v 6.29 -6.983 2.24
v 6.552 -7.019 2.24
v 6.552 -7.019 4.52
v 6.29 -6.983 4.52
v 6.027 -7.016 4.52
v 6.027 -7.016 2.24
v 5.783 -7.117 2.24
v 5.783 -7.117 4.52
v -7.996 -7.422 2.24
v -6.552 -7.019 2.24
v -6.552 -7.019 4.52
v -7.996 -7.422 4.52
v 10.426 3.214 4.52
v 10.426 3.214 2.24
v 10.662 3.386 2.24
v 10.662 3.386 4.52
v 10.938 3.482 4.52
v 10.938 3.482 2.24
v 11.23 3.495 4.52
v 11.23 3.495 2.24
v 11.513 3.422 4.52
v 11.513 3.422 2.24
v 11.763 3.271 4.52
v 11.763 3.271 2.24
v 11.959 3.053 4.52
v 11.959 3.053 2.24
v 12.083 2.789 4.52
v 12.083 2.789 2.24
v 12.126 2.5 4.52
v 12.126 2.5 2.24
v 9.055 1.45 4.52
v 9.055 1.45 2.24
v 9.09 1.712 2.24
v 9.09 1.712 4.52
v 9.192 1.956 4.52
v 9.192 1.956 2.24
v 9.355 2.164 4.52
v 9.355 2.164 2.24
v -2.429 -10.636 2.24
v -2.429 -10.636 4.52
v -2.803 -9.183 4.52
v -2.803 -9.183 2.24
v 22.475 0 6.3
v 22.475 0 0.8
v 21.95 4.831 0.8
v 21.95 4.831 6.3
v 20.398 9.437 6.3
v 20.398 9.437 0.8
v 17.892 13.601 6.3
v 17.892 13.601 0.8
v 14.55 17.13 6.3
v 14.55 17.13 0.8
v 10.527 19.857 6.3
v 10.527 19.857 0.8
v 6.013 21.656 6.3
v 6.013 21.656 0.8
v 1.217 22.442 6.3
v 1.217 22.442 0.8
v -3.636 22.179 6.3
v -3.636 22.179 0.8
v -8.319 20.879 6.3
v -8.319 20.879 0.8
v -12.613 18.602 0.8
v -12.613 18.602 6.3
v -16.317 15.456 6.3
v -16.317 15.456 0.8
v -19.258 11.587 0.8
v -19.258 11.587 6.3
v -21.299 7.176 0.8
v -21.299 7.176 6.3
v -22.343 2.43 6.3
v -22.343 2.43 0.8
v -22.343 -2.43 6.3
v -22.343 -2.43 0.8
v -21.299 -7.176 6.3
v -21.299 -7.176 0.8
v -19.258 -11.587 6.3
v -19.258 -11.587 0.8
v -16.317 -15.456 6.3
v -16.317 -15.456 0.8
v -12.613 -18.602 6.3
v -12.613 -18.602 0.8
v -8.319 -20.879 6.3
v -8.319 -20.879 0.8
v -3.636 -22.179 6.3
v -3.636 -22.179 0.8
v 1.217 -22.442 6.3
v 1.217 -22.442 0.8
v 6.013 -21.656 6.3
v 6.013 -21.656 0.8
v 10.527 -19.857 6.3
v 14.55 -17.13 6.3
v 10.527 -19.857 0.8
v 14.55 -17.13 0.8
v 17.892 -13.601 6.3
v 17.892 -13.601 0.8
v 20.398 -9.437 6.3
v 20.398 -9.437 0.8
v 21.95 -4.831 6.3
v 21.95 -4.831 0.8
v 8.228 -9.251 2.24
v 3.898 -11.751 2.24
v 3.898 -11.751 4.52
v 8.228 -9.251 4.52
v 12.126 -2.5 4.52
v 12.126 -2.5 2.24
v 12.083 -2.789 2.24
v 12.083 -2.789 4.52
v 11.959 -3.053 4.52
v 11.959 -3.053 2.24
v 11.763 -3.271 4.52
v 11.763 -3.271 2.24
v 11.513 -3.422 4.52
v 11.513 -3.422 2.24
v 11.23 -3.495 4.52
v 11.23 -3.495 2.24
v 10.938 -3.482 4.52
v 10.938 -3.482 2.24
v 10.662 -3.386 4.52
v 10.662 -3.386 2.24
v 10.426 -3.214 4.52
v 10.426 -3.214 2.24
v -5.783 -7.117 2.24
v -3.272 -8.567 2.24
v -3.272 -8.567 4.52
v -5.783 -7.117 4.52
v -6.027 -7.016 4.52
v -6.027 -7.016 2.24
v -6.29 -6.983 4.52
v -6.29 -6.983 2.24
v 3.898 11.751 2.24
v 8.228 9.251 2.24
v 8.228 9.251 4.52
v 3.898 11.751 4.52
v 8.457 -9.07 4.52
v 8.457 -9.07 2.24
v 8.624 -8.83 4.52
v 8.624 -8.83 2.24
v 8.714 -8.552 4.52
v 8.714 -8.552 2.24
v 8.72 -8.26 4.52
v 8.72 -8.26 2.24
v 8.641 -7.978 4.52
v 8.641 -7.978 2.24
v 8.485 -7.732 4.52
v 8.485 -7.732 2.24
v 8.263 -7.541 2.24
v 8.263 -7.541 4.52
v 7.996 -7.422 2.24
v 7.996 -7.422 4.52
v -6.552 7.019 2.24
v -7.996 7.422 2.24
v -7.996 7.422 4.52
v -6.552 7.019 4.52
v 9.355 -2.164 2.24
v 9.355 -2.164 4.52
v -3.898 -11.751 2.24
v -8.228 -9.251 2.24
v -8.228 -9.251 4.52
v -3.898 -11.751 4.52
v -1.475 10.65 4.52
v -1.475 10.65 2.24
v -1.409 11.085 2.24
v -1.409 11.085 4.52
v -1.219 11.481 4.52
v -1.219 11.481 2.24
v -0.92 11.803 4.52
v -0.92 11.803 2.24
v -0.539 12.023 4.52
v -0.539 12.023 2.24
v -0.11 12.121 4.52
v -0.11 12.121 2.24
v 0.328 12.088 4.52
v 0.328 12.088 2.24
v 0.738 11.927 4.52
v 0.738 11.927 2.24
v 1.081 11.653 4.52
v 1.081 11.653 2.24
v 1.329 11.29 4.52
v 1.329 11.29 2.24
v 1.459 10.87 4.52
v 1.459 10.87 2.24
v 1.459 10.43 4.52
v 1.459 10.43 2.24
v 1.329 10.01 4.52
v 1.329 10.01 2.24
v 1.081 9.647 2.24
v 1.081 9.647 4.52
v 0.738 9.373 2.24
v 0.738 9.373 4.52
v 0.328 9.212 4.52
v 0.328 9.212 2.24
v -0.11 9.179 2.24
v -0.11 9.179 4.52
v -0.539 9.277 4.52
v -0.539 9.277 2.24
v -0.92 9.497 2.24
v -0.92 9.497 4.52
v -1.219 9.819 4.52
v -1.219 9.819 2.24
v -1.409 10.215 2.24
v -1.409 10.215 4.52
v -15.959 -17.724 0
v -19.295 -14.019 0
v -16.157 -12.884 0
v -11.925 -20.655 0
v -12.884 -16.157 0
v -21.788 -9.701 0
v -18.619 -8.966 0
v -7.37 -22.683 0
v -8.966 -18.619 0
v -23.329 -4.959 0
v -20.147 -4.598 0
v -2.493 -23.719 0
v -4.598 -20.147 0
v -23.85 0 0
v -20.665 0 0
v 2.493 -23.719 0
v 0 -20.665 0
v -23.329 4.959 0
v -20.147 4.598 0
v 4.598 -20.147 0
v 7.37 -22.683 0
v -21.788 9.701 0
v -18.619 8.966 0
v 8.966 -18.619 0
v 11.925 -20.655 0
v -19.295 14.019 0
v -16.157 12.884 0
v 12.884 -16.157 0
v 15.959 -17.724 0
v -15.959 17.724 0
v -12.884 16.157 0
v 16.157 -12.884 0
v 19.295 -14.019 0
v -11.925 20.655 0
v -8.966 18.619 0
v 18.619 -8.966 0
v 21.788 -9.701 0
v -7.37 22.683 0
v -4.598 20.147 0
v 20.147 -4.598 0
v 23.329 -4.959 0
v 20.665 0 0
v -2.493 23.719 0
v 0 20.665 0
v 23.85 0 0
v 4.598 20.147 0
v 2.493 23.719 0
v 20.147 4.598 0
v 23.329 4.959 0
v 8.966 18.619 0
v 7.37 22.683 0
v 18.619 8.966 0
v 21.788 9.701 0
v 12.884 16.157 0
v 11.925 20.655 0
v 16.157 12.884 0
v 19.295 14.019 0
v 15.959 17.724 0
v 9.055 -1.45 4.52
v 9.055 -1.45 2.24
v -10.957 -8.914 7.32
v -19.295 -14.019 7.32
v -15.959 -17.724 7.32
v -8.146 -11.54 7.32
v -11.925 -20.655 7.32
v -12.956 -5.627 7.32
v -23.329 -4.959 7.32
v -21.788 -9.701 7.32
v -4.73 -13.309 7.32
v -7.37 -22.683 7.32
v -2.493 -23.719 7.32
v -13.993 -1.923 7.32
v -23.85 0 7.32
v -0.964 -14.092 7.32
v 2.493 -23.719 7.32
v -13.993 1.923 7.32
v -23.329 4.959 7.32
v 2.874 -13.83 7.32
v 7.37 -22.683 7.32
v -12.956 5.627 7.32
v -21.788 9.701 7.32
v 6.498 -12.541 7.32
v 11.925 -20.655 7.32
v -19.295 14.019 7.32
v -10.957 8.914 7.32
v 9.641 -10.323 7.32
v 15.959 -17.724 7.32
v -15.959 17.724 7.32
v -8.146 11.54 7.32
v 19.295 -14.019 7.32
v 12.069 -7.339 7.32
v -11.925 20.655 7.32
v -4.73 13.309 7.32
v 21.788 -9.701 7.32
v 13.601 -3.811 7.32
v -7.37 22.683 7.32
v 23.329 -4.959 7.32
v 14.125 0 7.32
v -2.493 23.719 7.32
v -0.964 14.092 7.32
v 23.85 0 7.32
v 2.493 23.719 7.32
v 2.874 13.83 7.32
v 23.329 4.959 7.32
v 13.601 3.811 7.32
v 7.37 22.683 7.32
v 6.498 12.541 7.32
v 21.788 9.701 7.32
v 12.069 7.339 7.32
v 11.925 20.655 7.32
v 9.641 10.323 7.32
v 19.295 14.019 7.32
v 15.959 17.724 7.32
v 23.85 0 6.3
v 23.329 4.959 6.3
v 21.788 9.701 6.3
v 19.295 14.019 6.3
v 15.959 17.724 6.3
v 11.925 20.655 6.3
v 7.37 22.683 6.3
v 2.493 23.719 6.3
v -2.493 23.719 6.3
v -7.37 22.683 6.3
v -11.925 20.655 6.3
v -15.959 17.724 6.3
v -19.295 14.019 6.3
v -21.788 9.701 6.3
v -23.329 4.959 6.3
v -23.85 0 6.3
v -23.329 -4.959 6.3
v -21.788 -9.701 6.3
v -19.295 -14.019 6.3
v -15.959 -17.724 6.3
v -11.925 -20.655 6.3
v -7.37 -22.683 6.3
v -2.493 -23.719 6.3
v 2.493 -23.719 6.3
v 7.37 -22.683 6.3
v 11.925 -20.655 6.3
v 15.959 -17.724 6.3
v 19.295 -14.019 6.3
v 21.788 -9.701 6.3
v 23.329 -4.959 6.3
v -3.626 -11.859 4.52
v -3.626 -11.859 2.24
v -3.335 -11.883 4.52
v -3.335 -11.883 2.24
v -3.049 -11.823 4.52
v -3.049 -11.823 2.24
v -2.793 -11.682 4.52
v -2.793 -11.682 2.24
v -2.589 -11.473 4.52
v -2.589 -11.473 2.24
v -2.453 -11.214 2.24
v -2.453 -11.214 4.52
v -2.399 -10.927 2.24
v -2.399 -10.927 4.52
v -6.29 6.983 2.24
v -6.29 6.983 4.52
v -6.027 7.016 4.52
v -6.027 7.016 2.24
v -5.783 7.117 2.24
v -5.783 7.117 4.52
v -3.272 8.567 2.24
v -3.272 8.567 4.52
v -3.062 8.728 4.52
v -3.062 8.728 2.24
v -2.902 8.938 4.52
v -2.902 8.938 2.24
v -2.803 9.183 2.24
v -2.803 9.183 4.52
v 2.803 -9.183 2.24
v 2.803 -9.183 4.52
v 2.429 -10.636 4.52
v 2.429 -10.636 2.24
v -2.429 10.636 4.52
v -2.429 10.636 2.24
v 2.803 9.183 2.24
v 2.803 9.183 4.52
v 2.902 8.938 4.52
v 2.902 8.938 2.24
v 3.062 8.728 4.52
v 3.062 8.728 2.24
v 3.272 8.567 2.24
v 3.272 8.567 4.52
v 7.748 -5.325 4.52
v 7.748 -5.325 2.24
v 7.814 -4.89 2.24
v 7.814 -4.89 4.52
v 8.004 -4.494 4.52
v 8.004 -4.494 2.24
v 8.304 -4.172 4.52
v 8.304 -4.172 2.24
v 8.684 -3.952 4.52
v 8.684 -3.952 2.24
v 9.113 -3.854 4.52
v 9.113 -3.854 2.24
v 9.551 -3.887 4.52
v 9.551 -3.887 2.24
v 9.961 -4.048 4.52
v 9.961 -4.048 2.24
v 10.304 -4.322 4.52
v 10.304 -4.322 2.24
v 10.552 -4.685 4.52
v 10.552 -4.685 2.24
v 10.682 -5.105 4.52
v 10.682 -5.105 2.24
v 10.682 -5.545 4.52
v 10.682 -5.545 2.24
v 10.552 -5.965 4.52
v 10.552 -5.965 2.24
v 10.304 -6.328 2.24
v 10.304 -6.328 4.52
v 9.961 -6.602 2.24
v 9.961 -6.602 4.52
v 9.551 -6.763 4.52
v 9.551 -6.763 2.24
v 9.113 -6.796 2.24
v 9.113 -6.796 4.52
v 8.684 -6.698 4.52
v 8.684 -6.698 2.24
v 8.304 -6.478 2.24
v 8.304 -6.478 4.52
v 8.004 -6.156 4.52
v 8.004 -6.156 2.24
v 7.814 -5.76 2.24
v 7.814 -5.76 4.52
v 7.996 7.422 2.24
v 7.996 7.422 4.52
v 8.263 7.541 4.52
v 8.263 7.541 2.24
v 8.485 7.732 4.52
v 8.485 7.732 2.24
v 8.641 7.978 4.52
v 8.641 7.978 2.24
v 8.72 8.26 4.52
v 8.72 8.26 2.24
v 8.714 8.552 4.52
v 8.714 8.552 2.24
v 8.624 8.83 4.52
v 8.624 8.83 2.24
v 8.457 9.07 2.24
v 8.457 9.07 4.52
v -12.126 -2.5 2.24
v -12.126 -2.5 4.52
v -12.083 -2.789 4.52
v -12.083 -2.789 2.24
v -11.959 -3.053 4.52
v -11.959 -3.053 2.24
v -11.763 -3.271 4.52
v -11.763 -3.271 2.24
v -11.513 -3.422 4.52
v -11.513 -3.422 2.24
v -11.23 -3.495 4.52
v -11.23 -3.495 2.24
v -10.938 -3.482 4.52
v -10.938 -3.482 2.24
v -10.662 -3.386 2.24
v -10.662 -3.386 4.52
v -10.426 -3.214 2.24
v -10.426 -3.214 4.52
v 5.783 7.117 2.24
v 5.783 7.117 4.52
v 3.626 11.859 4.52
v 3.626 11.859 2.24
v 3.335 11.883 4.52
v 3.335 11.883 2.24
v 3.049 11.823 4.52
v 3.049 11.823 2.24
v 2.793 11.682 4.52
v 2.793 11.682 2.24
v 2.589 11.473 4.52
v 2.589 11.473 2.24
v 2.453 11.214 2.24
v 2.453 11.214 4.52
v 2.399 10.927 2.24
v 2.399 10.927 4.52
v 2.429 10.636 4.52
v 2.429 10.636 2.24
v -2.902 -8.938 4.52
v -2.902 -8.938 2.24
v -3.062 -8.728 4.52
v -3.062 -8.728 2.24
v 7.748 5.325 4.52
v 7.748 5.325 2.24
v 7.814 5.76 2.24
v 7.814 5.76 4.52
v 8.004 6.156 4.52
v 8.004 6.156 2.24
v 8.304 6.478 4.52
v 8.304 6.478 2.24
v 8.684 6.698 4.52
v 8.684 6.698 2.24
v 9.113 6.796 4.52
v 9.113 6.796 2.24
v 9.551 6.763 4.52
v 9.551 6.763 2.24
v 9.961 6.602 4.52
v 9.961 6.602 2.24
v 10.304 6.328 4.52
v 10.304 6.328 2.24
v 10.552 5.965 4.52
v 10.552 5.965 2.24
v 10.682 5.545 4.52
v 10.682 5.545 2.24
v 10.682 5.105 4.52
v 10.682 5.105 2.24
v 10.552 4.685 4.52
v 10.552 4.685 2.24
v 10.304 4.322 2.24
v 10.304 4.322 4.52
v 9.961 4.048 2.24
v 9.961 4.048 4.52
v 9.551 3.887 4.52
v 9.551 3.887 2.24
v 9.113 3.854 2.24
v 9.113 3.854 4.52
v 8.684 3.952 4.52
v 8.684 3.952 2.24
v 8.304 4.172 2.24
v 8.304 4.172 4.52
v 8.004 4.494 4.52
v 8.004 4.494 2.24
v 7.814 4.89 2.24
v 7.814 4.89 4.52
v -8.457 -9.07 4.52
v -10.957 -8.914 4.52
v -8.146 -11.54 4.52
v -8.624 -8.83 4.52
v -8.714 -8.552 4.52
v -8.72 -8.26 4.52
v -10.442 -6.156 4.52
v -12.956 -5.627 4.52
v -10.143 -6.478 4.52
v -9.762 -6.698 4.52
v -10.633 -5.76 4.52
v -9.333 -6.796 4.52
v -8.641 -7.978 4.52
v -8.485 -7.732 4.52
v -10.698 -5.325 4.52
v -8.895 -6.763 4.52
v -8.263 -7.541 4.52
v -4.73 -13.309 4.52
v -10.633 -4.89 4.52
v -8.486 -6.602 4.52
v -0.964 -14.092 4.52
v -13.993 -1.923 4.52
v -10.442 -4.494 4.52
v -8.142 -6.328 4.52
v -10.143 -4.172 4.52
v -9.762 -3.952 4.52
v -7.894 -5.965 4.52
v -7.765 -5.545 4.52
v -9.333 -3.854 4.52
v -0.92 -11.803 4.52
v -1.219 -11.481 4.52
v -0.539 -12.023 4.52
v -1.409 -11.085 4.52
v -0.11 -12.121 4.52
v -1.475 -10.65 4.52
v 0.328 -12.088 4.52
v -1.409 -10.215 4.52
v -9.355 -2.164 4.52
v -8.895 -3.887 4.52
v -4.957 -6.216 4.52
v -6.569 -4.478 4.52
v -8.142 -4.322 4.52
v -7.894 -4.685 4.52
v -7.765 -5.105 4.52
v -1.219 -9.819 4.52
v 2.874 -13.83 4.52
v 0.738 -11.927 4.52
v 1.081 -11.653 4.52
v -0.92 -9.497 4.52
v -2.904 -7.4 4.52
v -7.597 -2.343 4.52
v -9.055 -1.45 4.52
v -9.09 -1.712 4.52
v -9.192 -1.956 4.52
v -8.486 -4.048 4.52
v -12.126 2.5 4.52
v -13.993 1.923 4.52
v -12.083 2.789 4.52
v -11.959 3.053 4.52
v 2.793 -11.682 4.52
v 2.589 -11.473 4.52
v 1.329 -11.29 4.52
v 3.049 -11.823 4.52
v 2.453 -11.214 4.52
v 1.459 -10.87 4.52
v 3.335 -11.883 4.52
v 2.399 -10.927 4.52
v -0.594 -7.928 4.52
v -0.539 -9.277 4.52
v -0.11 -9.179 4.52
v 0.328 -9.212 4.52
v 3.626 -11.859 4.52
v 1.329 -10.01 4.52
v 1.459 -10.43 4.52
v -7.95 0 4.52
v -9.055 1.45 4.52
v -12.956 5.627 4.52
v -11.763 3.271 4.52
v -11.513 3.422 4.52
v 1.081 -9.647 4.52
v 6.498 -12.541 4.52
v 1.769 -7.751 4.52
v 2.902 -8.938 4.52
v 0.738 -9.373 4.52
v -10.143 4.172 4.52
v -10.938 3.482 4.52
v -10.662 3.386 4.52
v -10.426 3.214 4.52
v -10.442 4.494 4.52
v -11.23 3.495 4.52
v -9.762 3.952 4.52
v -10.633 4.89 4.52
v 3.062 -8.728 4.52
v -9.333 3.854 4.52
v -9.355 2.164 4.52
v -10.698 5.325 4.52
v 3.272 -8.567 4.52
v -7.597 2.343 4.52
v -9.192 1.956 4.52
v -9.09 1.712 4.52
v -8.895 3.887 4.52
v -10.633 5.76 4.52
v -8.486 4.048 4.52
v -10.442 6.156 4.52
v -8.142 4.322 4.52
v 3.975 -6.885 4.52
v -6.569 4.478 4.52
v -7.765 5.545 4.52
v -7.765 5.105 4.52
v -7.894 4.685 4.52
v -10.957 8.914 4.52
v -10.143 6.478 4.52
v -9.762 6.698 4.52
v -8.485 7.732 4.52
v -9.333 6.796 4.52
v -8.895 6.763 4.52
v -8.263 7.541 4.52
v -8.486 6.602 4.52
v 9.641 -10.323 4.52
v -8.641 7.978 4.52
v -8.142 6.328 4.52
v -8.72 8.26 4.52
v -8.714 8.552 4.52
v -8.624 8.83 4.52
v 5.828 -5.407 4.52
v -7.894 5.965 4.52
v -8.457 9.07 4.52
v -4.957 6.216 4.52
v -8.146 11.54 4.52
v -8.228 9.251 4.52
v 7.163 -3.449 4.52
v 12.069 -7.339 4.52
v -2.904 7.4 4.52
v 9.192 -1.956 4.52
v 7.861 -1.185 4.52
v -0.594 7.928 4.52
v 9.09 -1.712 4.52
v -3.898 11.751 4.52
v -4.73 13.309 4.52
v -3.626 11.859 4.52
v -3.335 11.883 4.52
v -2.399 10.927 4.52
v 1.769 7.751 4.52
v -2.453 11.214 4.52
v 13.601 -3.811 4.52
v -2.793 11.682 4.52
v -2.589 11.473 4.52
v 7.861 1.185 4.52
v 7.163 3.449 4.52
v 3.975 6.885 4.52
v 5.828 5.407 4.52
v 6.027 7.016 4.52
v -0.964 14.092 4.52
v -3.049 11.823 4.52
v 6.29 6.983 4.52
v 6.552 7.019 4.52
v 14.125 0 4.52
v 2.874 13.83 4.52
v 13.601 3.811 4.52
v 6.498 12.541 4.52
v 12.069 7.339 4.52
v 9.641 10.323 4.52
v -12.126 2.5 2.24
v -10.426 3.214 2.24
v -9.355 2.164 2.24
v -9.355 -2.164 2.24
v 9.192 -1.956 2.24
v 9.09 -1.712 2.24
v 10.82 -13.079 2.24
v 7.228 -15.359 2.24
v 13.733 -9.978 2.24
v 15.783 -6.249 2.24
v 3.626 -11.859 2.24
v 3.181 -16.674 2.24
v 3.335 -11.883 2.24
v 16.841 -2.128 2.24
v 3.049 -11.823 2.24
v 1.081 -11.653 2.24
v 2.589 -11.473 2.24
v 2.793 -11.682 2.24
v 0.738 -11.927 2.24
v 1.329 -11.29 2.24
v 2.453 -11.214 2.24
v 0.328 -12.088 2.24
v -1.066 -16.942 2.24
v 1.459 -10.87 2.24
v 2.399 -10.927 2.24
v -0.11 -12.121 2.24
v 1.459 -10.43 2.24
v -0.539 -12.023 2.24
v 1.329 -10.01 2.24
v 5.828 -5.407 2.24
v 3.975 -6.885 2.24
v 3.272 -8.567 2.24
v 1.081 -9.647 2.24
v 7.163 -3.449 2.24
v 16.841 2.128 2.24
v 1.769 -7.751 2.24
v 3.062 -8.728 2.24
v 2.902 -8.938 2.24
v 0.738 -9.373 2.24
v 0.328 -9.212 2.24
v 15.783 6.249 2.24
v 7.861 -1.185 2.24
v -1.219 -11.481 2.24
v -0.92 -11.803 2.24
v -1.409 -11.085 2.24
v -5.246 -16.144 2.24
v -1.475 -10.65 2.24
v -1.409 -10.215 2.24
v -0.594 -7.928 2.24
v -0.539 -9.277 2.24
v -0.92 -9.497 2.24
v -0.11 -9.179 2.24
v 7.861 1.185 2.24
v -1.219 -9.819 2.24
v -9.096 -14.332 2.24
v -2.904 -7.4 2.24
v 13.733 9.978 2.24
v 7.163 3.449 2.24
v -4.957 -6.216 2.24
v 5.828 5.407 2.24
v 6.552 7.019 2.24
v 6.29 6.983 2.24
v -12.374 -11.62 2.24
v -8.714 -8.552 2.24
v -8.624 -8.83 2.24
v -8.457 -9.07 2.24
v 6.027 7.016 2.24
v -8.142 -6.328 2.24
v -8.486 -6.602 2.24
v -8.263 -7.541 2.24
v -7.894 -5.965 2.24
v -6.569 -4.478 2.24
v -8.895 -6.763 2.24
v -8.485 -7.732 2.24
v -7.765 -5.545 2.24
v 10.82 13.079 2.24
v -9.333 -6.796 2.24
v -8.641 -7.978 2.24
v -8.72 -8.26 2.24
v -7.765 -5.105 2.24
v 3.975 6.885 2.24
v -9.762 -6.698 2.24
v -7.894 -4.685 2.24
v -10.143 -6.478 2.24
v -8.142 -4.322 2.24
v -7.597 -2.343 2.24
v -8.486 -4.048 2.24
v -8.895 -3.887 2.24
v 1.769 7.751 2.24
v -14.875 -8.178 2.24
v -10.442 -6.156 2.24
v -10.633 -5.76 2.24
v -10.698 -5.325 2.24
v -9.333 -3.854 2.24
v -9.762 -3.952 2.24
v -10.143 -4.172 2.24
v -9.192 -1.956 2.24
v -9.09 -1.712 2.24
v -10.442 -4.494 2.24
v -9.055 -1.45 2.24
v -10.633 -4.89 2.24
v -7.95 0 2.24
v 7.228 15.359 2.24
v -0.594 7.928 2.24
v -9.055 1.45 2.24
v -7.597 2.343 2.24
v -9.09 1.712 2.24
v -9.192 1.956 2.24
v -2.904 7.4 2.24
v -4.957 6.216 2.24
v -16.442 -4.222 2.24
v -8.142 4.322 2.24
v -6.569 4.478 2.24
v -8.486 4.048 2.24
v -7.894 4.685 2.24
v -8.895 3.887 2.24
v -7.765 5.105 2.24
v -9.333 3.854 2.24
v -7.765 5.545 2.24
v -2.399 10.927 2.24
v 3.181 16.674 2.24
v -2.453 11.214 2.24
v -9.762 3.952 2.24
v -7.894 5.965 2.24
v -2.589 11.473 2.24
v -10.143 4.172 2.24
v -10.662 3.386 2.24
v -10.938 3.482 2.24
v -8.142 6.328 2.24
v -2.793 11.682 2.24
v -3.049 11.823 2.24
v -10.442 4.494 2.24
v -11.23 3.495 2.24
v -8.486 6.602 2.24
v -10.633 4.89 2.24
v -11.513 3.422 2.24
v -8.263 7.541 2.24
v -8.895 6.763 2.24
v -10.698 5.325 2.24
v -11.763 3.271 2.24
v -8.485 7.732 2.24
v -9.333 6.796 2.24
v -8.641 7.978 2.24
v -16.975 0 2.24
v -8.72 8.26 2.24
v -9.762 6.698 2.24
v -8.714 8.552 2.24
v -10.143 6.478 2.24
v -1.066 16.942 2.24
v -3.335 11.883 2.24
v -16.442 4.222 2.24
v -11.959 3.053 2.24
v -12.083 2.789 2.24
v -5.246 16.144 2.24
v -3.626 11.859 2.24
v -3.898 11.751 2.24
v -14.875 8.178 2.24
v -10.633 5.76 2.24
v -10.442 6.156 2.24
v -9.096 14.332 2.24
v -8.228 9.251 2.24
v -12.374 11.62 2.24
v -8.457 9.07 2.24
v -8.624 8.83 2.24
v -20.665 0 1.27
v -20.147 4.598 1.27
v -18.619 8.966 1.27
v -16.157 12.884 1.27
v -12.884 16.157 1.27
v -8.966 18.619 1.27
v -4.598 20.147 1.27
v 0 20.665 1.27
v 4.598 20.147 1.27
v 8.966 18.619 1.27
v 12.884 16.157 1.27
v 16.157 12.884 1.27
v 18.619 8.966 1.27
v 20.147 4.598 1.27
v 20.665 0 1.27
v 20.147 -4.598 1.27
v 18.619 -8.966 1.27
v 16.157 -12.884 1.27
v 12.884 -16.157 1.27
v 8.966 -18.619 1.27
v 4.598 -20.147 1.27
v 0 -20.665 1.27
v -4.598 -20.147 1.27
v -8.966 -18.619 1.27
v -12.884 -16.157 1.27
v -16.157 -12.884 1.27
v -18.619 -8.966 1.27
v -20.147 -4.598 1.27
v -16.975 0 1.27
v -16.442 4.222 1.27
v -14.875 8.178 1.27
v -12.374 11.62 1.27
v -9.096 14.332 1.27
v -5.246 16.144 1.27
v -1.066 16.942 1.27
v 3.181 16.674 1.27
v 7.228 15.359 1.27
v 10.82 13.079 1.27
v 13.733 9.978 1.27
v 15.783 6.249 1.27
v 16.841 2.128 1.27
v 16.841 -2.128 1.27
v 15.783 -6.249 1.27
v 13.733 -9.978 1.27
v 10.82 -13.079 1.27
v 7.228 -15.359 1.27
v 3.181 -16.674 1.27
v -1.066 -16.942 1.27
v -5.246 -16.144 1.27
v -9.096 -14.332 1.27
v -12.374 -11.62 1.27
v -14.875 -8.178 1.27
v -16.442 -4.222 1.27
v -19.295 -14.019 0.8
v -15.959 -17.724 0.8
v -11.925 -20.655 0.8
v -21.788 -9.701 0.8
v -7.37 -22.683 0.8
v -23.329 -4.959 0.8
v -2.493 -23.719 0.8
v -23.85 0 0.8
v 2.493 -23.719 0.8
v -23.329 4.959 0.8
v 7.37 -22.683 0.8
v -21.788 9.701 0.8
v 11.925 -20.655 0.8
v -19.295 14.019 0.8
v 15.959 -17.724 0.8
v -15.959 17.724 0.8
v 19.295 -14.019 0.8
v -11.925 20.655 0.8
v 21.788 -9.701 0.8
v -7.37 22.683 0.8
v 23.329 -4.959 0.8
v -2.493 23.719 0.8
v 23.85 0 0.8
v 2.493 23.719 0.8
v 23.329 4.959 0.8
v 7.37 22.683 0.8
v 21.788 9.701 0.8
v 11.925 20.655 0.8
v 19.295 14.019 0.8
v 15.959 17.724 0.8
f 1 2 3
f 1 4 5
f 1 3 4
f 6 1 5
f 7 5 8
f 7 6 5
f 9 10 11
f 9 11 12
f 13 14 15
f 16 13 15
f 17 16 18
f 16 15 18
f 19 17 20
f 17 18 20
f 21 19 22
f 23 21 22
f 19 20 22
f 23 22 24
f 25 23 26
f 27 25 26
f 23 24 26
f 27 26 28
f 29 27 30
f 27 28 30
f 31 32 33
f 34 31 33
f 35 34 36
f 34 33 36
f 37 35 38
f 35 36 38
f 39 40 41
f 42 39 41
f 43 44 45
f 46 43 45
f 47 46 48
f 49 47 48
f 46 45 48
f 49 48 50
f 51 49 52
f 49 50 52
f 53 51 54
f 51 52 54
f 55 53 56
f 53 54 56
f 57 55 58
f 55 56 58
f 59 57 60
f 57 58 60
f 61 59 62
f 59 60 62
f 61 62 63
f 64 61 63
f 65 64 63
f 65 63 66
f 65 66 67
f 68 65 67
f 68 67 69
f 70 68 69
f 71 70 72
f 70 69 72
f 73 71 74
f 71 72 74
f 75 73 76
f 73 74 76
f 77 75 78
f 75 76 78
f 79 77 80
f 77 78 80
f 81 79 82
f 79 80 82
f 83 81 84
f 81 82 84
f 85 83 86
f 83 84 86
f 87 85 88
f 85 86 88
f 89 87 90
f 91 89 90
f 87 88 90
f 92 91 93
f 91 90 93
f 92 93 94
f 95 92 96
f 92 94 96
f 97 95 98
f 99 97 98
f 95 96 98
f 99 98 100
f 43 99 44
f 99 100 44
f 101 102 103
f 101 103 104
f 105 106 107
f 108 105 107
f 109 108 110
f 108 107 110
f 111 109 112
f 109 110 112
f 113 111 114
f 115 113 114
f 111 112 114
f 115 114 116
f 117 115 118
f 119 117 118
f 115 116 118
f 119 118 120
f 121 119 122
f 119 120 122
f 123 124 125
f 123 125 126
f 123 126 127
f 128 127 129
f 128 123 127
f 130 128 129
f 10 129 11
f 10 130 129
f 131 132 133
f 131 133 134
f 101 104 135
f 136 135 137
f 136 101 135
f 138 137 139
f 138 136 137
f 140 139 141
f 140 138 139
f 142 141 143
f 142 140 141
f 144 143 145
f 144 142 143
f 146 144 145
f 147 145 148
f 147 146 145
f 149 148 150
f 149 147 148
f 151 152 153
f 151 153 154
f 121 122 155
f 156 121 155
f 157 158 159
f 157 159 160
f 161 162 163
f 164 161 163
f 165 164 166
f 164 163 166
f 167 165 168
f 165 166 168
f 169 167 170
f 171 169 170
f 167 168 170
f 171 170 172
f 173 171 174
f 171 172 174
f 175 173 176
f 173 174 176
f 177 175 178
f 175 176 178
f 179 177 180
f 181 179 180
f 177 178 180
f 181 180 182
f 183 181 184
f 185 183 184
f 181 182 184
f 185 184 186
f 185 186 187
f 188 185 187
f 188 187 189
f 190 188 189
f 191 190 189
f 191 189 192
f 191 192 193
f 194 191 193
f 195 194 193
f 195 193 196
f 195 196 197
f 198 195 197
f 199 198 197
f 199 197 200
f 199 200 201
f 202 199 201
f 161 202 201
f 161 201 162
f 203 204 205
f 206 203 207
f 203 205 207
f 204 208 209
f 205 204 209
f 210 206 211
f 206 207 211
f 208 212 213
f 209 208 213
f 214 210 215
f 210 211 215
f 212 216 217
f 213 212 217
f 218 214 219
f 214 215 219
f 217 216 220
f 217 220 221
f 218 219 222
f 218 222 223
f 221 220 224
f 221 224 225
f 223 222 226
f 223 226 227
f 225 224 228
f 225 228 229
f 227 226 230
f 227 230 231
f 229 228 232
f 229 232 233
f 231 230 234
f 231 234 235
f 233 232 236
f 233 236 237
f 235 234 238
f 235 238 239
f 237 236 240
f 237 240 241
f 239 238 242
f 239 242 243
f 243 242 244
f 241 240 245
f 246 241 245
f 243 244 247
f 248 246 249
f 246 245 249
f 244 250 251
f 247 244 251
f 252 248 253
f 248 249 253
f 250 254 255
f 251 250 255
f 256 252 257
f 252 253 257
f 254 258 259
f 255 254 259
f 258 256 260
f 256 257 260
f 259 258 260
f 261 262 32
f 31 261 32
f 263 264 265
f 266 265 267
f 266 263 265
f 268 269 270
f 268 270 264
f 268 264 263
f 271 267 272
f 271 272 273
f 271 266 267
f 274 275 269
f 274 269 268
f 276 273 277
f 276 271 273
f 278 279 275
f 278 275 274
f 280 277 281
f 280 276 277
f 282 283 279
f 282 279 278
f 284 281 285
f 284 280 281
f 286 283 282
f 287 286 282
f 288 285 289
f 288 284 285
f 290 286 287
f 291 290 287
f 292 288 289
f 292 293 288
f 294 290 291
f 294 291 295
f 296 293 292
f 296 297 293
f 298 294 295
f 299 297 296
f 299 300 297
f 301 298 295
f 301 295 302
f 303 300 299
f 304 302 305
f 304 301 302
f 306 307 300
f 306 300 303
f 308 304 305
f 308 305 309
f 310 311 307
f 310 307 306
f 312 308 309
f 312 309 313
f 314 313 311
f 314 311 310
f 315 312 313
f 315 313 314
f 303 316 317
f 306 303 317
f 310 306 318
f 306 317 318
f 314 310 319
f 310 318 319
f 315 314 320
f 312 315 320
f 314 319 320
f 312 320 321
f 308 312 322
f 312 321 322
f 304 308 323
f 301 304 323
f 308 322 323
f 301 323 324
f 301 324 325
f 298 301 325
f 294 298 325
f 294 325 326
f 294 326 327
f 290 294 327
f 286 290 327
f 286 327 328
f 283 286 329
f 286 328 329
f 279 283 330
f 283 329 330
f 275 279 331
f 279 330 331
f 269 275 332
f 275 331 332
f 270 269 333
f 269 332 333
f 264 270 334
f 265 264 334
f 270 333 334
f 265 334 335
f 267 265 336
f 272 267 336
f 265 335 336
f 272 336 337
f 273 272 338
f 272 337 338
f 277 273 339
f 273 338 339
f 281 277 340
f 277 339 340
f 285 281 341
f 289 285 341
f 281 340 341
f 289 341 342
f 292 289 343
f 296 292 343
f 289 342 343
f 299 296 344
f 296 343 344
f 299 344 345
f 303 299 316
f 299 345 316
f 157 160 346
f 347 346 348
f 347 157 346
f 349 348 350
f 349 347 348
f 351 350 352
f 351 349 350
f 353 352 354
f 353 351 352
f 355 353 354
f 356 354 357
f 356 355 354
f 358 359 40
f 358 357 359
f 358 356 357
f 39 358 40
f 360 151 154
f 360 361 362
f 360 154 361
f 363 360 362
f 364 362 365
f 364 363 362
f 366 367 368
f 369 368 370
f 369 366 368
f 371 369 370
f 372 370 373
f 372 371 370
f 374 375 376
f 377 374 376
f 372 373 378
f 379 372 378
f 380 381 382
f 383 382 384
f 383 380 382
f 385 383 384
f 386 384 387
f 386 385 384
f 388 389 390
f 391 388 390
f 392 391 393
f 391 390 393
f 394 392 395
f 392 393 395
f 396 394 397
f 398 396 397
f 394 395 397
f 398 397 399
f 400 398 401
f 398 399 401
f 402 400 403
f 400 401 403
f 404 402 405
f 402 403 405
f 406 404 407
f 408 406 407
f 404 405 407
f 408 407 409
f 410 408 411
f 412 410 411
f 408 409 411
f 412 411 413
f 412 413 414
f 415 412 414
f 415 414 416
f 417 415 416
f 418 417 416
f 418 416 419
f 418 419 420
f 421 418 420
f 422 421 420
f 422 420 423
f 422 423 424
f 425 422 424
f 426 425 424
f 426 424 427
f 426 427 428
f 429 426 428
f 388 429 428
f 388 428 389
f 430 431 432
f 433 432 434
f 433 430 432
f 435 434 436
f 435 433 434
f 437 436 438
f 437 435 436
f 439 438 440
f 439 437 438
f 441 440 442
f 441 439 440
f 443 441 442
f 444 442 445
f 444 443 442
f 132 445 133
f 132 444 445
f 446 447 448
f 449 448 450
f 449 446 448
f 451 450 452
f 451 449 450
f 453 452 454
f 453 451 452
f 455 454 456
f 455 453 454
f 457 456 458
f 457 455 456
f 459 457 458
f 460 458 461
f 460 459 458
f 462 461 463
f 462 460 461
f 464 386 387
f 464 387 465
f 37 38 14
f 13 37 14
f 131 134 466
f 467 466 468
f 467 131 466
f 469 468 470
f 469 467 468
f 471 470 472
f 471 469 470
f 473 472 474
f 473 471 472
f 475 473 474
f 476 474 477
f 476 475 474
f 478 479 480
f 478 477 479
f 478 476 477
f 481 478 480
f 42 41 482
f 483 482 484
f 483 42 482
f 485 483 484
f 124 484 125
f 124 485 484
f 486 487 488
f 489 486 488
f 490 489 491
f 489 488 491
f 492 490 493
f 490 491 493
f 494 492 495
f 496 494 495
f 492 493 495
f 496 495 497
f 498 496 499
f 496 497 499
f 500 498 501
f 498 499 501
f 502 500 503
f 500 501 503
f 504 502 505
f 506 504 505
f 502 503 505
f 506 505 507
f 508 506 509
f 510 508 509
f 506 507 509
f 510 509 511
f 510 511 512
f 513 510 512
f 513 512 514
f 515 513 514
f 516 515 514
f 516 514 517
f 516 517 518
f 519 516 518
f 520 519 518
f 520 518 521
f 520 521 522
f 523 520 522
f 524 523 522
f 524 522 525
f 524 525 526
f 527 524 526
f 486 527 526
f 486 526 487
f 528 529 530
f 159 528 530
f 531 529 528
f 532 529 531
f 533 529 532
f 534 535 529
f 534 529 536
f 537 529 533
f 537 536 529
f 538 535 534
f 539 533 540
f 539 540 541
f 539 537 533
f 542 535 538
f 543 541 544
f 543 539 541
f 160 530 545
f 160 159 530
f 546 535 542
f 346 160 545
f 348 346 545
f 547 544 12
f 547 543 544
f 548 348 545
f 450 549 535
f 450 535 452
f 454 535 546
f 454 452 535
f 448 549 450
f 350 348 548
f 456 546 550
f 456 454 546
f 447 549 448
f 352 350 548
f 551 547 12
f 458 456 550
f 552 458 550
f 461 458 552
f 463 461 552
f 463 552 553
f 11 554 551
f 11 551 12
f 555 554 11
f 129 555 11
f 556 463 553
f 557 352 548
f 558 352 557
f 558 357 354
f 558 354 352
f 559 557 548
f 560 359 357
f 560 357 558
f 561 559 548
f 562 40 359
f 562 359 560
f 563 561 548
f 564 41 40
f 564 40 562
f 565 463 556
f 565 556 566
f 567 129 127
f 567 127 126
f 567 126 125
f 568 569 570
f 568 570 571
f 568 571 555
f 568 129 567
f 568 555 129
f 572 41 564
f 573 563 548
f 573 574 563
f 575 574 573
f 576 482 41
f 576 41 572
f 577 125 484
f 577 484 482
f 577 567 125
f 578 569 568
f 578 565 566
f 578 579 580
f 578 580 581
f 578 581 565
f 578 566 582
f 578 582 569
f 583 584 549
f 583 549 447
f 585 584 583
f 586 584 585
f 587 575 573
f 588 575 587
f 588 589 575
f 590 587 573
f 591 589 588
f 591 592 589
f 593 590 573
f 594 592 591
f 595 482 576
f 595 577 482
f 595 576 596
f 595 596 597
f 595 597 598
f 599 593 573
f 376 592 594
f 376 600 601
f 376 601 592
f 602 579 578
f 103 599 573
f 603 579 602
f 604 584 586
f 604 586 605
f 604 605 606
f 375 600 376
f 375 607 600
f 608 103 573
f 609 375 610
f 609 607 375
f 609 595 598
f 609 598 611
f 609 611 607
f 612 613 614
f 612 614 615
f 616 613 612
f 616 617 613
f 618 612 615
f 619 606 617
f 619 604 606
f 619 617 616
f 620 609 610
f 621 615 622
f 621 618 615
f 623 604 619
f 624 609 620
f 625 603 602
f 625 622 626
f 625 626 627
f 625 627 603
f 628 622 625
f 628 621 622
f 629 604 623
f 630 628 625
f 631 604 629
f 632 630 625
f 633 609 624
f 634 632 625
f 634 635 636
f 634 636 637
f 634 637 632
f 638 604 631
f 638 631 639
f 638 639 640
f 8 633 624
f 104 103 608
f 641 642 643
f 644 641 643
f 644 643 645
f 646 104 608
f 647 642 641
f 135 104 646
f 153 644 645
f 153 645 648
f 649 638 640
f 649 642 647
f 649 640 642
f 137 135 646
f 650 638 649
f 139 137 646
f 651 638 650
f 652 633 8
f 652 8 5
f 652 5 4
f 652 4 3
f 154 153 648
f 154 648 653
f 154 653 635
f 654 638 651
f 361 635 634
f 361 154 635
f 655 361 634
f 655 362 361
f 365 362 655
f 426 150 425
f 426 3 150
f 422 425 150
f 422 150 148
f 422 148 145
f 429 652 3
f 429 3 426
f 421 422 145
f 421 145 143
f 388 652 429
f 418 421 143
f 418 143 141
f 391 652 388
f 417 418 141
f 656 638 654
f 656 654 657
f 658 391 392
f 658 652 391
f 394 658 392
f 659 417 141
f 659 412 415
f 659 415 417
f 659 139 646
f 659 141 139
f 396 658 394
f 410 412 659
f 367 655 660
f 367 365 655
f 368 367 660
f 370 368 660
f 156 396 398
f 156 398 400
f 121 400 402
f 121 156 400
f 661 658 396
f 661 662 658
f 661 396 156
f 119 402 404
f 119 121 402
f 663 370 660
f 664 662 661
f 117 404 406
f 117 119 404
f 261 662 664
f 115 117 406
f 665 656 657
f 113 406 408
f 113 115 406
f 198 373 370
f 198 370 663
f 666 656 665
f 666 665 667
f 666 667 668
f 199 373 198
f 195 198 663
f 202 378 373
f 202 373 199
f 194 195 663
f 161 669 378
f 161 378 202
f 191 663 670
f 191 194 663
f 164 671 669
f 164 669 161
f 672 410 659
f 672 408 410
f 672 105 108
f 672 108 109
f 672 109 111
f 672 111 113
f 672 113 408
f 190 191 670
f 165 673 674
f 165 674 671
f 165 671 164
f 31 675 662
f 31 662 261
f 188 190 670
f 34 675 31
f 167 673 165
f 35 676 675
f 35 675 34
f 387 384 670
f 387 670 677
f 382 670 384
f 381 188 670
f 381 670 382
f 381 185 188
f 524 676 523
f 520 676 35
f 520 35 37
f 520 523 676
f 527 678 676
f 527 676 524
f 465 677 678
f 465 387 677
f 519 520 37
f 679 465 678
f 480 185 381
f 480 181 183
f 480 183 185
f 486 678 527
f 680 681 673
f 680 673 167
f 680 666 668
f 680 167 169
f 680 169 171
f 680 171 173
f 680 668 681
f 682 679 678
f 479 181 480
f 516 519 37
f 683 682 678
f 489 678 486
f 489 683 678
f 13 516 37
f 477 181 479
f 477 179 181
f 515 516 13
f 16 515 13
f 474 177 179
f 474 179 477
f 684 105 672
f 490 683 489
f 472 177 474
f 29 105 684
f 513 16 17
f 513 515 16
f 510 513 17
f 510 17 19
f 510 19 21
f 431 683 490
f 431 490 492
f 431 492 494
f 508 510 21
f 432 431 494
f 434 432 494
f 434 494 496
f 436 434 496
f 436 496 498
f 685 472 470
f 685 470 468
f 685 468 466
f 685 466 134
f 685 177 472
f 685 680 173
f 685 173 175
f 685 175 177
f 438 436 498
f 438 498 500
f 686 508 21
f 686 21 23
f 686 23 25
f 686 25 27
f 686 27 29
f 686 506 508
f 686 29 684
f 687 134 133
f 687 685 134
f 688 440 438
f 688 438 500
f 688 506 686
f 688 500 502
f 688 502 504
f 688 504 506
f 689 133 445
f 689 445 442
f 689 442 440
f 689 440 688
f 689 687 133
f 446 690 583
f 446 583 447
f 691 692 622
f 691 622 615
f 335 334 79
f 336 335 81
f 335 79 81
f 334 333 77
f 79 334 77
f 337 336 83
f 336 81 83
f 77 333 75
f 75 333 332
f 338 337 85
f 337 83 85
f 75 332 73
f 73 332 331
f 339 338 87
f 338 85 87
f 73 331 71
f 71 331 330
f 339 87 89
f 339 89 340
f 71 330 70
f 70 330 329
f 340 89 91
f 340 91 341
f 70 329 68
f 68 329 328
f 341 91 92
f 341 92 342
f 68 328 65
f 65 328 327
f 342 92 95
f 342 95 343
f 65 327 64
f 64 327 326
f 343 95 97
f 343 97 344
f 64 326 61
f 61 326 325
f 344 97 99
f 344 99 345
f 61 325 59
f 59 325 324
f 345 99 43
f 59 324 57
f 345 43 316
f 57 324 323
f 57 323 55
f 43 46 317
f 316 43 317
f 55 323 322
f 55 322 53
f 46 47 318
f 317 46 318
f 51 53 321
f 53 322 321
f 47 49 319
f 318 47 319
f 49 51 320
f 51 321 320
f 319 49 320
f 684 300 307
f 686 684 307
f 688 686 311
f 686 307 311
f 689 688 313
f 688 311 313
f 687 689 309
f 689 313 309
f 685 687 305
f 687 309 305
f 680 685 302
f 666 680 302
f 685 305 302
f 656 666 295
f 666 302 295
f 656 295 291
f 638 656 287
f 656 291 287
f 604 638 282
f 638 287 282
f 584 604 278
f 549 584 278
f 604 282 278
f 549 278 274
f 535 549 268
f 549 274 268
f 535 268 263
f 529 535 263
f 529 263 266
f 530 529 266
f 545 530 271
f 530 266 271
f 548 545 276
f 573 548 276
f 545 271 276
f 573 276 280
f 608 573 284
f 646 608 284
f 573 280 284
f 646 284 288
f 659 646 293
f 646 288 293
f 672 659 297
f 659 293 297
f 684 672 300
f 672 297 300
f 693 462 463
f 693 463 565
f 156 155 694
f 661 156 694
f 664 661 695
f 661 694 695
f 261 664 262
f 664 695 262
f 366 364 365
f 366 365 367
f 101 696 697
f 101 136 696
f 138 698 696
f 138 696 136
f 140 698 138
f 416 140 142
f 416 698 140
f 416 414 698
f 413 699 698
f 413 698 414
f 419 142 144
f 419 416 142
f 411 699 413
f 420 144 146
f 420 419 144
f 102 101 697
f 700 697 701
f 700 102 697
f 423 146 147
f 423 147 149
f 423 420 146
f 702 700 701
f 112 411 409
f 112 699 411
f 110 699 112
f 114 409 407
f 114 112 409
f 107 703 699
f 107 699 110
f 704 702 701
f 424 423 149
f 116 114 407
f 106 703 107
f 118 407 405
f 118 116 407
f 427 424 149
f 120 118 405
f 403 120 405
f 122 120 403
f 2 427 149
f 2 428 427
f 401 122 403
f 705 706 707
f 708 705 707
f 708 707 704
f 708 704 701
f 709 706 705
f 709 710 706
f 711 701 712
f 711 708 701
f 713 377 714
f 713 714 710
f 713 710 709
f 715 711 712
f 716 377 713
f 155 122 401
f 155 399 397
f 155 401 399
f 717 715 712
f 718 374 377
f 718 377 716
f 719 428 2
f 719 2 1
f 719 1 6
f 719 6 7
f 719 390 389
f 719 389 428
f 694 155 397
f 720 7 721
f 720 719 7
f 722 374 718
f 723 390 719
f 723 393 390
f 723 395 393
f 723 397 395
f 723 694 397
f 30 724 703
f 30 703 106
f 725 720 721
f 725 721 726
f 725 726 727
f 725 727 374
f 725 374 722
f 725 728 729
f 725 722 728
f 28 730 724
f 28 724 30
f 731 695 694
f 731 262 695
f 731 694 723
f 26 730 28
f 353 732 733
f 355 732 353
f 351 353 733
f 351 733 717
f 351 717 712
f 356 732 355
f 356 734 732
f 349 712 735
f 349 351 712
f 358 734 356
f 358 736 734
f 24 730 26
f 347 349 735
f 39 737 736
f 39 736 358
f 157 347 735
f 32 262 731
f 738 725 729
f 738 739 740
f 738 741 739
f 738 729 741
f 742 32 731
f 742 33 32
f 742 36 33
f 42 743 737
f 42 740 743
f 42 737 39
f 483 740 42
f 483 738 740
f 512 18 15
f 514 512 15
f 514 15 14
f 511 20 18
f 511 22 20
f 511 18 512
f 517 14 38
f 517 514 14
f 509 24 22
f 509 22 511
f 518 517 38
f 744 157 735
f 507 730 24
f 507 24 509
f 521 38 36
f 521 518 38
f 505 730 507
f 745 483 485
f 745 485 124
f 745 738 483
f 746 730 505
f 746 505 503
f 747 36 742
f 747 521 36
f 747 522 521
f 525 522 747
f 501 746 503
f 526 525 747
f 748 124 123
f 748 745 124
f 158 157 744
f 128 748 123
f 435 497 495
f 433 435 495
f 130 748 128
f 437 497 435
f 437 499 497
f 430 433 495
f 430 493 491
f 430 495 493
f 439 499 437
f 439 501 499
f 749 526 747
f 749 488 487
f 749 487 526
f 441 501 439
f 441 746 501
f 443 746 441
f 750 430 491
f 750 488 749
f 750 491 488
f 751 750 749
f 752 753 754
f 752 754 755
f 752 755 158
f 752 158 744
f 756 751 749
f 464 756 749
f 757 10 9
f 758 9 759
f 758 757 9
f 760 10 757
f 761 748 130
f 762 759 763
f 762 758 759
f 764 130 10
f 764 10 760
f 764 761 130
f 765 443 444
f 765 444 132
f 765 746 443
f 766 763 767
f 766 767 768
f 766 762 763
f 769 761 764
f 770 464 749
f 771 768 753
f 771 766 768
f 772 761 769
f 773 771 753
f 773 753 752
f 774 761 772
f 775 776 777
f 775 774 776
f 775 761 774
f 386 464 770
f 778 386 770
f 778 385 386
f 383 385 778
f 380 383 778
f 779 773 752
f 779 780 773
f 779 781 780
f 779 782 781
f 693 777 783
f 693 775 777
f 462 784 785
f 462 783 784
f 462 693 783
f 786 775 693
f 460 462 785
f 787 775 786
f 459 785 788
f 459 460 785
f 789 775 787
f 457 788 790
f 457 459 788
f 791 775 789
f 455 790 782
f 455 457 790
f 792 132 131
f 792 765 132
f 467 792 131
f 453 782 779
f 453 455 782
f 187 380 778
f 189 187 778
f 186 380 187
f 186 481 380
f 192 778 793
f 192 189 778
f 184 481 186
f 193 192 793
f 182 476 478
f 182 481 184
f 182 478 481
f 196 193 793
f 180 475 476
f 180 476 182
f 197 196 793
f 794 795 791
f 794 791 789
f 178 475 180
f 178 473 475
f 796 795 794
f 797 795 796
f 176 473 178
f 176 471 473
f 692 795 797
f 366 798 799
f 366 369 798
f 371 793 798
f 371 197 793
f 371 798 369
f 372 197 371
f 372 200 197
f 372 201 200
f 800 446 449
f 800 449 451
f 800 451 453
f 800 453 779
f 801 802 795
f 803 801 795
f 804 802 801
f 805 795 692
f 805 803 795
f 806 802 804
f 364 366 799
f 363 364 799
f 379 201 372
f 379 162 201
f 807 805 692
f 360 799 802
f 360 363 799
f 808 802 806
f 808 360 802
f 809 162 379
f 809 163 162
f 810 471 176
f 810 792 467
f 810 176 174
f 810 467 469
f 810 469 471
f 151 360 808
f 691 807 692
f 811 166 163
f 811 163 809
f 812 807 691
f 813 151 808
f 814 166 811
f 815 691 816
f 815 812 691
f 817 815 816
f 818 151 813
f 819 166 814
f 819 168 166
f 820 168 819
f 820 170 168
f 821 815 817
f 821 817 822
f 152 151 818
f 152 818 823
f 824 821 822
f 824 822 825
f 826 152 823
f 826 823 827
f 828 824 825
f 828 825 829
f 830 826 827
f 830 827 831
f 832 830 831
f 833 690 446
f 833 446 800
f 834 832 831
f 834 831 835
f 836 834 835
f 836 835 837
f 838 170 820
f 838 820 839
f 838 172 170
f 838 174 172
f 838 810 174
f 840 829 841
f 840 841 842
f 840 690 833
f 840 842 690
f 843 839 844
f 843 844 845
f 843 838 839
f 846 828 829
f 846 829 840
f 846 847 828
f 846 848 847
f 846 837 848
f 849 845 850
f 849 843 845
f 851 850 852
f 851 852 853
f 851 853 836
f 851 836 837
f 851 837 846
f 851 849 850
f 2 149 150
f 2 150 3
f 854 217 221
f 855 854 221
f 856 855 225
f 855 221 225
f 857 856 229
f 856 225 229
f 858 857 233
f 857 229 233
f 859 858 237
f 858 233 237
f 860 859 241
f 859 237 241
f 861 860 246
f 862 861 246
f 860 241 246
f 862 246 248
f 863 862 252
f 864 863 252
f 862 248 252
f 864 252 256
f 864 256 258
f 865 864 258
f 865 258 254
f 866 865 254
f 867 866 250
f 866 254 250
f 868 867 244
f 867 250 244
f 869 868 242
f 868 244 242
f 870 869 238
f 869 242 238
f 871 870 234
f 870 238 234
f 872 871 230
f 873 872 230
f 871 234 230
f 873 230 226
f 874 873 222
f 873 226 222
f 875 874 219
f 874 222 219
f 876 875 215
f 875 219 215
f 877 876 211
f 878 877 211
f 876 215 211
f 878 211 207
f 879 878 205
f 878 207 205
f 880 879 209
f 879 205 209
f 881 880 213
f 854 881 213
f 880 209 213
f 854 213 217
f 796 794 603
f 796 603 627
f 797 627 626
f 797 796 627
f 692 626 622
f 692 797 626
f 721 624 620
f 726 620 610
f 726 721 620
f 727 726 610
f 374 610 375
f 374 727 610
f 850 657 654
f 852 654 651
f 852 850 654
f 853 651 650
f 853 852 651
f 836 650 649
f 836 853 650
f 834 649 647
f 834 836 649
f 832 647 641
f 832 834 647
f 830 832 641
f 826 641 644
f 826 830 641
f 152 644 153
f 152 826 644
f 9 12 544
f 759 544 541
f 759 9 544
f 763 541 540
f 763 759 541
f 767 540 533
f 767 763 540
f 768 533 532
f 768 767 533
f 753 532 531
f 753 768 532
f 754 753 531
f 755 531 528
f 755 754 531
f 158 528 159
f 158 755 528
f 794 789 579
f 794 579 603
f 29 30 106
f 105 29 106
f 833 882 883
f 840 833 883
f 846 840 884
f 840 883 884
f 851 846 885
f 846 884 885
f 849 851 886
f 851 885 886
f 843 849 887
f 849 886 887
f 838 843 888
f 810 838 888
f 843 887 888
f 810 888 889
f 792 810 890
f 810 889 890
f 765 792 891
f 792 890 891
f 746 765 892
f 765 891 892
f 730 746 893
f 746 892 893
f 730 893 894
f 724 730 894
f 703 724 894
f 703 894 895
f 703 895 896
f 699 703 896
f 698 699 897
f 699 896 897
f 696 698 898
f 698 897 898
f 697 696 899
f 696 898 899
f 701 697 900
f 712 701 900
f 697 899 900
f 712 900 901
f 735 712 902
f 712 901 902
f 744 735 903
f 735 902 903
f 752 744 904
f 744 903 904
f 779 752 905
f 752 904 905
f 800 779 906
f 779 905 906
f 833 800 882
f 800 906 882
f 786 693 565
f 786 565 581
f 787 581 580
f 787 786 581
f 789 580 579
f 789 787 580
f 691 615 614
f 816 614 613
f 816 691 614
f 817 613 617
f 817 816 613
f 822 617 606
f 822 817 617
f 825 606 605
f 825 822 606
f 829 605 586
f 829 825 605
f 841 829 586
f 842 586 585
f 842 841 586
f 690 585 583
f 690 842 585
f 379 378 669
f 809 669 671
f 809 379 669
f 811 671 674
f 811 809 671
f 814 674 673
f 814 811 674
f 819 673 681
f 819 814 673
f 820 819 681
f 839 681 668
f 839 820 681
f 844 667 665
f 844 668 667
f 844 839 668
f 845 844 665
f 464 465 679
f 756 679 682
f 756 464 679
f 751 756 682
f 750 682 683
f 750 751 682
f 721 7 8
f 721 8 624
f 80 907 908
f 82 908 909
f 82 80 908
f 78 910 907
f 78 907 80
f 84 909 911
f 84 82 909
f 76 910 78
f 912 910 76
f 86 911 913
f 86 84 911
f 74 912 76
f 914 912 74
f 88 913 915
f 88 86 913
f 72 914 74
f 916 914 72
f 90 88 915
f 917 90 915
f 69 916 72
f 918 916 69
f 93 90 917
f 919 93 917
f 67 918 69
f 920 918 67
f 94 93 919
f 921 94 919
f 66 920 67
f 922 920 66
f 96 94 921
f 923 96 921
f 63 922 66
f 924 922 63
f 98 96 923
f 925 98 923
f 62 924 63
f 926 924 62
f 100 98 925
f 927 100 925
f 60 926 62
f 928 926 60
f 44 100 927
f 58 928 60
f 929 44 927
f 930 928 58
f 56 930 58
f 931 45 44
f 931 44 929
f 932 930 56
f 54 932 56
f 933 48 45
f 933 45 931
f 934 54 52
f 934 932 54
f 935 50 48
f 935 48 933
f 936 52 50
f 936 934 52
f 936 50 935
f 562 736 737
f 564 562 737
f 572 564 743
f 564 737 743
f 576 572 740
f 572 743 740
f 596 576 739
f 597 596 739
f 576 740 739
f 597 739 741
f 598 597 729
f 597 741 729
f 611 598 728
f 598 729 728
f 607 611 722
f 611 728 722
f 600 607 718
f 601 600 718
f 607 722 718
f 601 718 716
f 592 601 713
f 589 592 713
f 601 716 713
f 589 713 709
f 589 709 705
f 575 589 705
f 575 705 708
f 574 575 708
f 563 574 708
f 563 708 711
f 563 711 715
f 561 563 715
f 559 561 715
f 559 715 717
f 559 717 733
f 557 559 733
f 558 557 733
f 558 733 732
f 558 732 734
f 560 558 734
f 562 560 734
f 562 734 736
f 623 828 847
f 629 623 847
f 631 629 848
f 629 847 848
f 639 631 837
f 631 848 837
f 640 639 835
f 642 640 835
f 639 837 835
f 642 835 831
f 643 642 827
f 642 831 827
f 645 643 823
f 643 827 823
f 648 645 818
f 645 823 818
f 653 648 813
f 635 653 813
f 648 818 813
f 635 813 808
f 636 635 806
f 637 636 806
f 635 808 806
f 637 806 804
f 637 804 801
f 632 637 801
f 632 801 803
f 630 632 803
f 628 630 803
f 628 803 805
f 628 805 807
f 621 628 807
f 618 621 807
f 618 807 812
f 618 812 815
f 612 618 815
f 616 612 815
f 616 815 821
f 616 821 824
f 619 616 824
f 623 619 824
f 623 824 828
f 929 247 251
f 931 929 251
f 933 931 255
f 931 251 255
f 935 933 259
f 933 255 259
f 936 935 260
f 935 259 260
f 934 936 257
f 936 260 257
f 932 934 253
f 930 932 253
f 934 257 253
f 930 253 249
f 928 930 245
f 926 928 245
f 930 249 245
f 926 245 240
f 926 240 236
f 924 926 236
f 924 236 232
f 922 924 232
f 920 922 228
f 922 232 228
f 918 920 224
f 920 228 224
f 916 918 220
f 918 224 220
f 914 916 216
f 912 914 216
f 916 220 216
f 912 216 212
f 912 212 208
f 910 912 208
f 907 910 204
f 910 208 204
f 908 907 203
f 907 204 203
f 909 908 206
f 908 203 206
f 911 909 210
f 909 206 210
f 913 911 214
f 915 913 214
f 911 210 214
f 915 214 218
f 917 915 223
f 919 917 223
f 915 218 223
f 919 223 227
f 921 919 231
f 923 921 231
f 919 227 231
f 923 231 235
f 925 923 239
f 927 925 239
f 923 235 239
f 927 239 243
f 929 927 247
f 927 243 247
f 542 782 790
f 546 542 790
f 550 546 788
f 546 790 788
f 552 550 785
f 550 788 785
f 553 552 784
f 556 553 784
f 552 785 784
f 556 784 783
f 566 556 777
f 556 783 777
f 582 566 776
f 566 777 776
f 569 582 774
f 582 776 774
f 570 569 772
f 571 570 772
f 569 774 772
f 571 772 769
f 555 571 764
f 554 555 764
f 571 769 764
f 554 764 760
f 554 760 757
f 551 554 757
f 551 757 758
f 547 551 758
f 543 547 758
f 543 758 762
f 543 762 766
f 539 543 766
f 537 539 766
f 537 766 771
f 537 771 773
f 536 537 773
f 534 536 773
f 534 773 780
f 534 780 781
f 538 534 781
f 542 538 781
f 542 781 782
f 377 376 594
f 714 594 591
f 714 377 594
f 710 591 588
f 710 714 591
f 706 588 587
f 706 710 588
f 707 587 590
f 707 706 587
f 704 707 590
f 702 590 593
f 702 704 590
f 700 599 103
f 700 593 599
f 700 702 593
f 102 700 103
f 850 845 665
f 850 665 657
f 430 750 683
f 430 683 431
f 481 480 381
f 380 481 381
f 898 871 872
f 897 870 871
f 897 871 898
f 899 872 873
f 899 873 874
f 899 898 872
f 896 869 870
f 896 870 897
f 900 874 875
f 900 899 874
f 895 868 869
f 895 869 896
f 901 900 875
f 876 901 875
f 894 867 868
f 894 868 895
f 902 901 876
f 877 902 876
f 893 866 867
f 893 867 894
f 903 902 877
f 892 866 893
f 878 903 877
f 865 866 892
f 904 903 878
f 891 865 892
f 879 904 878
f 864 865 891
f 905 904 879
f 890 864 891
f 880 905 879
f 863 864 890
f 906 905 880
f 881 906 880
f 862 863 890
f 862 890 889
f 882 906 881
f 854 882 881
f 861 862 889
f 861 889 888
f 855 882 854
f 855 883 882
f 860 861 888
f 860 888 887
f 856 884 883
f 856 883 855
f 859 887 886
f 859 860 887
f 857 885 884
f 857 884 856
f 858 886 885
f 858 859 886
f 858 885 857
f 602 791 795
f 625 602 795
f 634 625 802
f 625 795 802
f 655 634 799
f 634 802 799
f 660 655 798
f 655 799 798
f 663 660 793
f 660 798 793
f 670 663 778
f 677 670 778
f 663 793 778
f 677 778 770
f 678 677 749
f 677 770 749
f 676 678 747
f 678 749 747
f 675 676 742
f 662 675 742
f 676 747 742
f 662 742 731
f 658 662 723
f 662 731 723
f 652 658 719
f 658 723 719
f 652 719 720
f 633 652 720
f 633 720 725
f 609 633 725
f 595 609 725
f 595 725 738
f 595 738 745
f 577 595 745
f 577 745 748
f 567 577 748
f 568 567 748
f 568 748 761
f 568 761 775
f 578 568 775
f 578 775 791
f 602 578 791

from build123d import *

# Parameters (mm, degrees)
SCHIZZO1_R                   = 23.85
ESTRUSIONE_ESTRUSIONE1_DEPTH = 0.8
SCHIZZO2_R                   = 22.475
ESTRUSIONE_ESTRUSIONE2_DEPTH = 5.5
SCHIZZO3_R                   = 23.85
ESTRUSIONE_ESTRUSIONE3_DEPTH = 1.02
SCHIZZO4_R                   = 20.665
TAGLIO_ESTRUSIONE1_DEPTH     = 1.27
SCHIZZO5_R                   = 16.975
TAGLIO_ESTRUSIONE2_DEPTH     = 0.97
SCHIZZO6_R                   = 7.95
TAGLIO_ESTRUSIONE3_DEPTH     = 35.109403396
SCHIZZO7_R                   = 14.125
TAGLIO_ESTRUSIONE4_DEPTH     = 2.8
SCHIZZO10_R                  = 1.475
TAGLIO_ESTRUSIONE5_DEPTH     = 35.109403396


with BuildPart() as part:
    # Schizzo1 → Estrusione-Estrusione1 (new body)
    with BuildSketch(Plane.XY):
        Circle(SCHIZZO1_R)
    extrude(amount=ESTRUSIONE_ESTRUSIONE1_DEPTH)

    # Schizzo2 → Estrusione-Estrusione2 (add)
    with BuildSketch(Plane.XY.offset(0.8)):
        Circle(SCHIZZO2_R)
    extrude(amount=ESTRUSIONE_ESTRUSIONE2_DEPTH)

    # Schizzo3 → Estrusione-Estrusione3 (add)
    with BuildSketch(Plane.XY.offset(6.3)):
        Circle(SCHIZZO3_R)
    extrude(amount=ESTRUSIONE_ESTRUSIONE3_DEPTH)

    # Schizzo4 → Taglio-Estrusione1 (cut)
    with BuildSketch(Plane(origin=(0, 0, 0), x_dir=(-1, 0, 0), z_dir=(0, 0, -1))):
        Circle(SCHIZZO4_R)
    extrude(amount=-TAGLIO_ESTRUSIONE1_DEPTH, mode=Mode.SUBTRACT)

    # Schizzo5 → Taglio-Estrusione2 (cut)
    with BuildSketch(Plane(origin=(0, 0, 1.27), x_dir=(-1, 0, 0), z_dir=(0, 0, -1))):
        Circle(SCHIZZO5_R)
    extrude(amount=-TAGLIO_ESTRUSIONE2_DEPTH, mode=Mode.SUBTRACT)

    # Schizzo6 → Taglio-Estrusione3 (cut, through all)
    with BuildSketch(Plane(origin=(0, 0, 2.24), x_dir=(-1, 0, 0), z_dir=(0, 0, -1))):
        Circle(SCHIZZO6_R)
    extrude(amount=-TAGLIO_ESTRUSIONE3_DEPTH, mode=Mode.SUBTRACT)

    # Schizzo7 → Taglio-Estrusione4 (cut)
    with BuildSketch(Plane.XY.offset(7.32)):
        Circle(SCHIZZO7_R)
    extrude(amount=-TAGLIO_ESTRUSIONE4_DEPTH, mode=Mode.SUBTRACT)

    # Schizzo10 → Taglio-Estrusione5 (cut, through all)
    with BuildSketch(Plane(origin=(0, 0, 2.24), x_dir=(-1, 0, 0), z_dir=(0, 0, -1))):
        with Locations((0, 10.65)):
            Circle(SCHIZZO10_R)
        with Locations((9.22317055, 5.325)):
            Circle(SCHIZZO10_R)
        with Locations((9.22317055, -5.325)):
            Circle(SCHIZZO10_R)
        with Locations((0, -10.65)):
            Circle(SCHIZZO10_R)
        with Locations((-9.22317055, -5.325)):
            Circle(SCHIZZO10_R)
        with Locations((-9.22317055, 5.325)):
            Circle(SCHIZZO10_R)
        with BuildLine():
            Line((-12.12588027, 2.5), (-12.12588027, -2.5))
            ThreePointArc((-12.12588027, -2.5), (-11.513178605, -3.421954446), (-10.42588027, -3.214142843))
            Line((-10.42588027, -3.214142843), (-9.354666006, -2.164142843))
            ThreePointArc((-9.354666006, -2.164142843), (-9.13271156, -1.837298335), (-9.054666006, -1.45))
            Line((-9.054666006, -1.45), (-9.054666006, 1.45))
            ThreePointArc((-9.054666006, 1.45), (-9.13271156, 1.837298335), (-9.354666006, 2.164142843))
            Line((-9.354666006, 2.164142843), (-10.42588027, 3.214142843))
            ThreePointArc((-10.42588027, 3.214142843), (-11.513178605, 3.421954446), (-12.12588027, 2.5))
        make_face()
        with BuildLine():
            Line((-2.429410782, 10.636148592), (-2.803130324, 9.183449827))
            ThreePointArc((-2.803130324, 9.183449827), (-2.975208748, 8.827809384), (-3.271596168, 8.566570784))
            Line((-3.271596168, 8.566570784), (-5.783069839, 7.116570784))
            ThreePointArc((-5.783069839, 7.116570784), (-6.157502812, 6.990511049), (-6.551535682, 7.019306984))
            Line((-6.551535682, 7.019306984), (-7.996469488, 7.42200575))
            ThreePointArc((-7.996469488, 7.42200575), (-8.720088783, 8.259727927), (-8.228003645, 9.251320357))
            Line((-8.228003645, 9.251320357), (-3.897876626, 11.751320357))
            ThreePointArc((-3.897876626, 11.751320357), (-2.793089822, 11.681682373), (-2.429410782, 10.636148592))
        make_face()
        with BuildLine():
            Line((7.996469488, 7.42200575), (6.551535682, 7.019306984))
            ThreePointArc((6.551535682, 7.019306984), (6.157502812, 6.990511049), (5.783069839, 7.116570784))
            Line((5.783069839, 7.116570784), (3.271596168, 8.566570784))
            ThreePointArc((3.271596168, 8.566570784), (2.975208748, 8.827809384), (2.803130324, 9.183449827))
            Line((2.803130324, 9.183449827), (2.429410782, 10.636148592))
            ThreePointArc((2.429410782, 10.636148592), (2.793089822, 11.681682373), (3.897876626, 11.751320357))
            Line((3.897876626, 11.751320357), (8.228003645, 9.251320357))
            ThreePointArc((8.228003645, 9.251320357), (8.720088783, 8.259727927), (7.996469488, 7.42200575))
        make_face()
        with BuildLine():
            Line((10.42588027, -3.214142843), (9.354666006, -2.164142843))
            ThreePointArc((9.354666006, -2.164142843), (9.13271156, -1.837298335), (9.054666006, -1.45))
            Line((9.054666006, -1.45), (9.054666006, 1.45))
            ThreePointArc((9.054666006, 1.45), (9.13271156, 1.837298335), (9.354666006, 2.164142843))
            Line((9.354666006, 2.164142843), (10.42588027, 3.214142843))
            ThreePointArc((10.42588027, 3.214142843), (11.513178605, 3.421954446), (12.12588027, 2.5))
            Line((12.12588027, 2.5), (12.12588027, -2.5))
            ThreePointArc((12.12588027, -2.5), (11.513178605, -3.421954446), (10.42588027, -3.214142843))
        make_face()
        with BuildLine():
            Line((2.429410782, -10.636148592), (2.803130324, -9.183449827))
            ThreePointArc((2.803130324, -9.183449827), (2.975208748, -8.827809384), (3.271596168, -8.566570784))
            Line((3.271596168, -8.566570784), (5.783069839, -7.116570784))
            ThreePointArc((5.783069839, -7.116570784), (6.157502812, -6.990511049), (6.551535682, -7.019306984))
            Line((6.551535682, -7.019306984), (7.996469488, -7.42200575))
            ThreePointArc((7.996469488, -7.42200575), (8.720088783, -8.259727927), (8.228003645, -9.251320357))
            Line((8.228003645, -9.251320357), (3.897876626, -11.751320357))
            ThreePointArc((3.897876626, -11.751320357), (2.793089822, -11.681682373), (2.429410782, -10.636148592))
        make_face()
        with BuildLine():
            Line((-7.996469488, -7.42200575), (-6.551535682, -7.019306984))
            ThreePointArc((-6.551535682, -7.019306984), (-6.157502812, -6.990511049), (-5.783069839, -7.116570784))
            Line((-5.783069839, -7.116570784), (-3.271596168, -8.566570784))
            ThreePointArc((-3.271596168, -8.566570784), (-2.975208748, -8.827809384), (-2.803130324, -9.183449827))
            Line((-2.803130324, -9.183449827), (-2.429410782, -10.636148592))
            ThreePointArc((-2.429410782, -10.636148592), (-2.793089822, -11.681682373), (-3.897876626, -11.751320357))
            Line((-3.897876626, -11.751320357), (-8.228003645, -9.251320357))
            ThreePointArc((-8.228003645, -9.251320357), (-8.720088783, -8.259727927), (-7.996469488, -7.42200575))
        make_face()
    extrude(amount=-TAGLIO_ESTRUSIONE5_DEPTH, mode=Mode.SUBTRACT)


solid = part.part
